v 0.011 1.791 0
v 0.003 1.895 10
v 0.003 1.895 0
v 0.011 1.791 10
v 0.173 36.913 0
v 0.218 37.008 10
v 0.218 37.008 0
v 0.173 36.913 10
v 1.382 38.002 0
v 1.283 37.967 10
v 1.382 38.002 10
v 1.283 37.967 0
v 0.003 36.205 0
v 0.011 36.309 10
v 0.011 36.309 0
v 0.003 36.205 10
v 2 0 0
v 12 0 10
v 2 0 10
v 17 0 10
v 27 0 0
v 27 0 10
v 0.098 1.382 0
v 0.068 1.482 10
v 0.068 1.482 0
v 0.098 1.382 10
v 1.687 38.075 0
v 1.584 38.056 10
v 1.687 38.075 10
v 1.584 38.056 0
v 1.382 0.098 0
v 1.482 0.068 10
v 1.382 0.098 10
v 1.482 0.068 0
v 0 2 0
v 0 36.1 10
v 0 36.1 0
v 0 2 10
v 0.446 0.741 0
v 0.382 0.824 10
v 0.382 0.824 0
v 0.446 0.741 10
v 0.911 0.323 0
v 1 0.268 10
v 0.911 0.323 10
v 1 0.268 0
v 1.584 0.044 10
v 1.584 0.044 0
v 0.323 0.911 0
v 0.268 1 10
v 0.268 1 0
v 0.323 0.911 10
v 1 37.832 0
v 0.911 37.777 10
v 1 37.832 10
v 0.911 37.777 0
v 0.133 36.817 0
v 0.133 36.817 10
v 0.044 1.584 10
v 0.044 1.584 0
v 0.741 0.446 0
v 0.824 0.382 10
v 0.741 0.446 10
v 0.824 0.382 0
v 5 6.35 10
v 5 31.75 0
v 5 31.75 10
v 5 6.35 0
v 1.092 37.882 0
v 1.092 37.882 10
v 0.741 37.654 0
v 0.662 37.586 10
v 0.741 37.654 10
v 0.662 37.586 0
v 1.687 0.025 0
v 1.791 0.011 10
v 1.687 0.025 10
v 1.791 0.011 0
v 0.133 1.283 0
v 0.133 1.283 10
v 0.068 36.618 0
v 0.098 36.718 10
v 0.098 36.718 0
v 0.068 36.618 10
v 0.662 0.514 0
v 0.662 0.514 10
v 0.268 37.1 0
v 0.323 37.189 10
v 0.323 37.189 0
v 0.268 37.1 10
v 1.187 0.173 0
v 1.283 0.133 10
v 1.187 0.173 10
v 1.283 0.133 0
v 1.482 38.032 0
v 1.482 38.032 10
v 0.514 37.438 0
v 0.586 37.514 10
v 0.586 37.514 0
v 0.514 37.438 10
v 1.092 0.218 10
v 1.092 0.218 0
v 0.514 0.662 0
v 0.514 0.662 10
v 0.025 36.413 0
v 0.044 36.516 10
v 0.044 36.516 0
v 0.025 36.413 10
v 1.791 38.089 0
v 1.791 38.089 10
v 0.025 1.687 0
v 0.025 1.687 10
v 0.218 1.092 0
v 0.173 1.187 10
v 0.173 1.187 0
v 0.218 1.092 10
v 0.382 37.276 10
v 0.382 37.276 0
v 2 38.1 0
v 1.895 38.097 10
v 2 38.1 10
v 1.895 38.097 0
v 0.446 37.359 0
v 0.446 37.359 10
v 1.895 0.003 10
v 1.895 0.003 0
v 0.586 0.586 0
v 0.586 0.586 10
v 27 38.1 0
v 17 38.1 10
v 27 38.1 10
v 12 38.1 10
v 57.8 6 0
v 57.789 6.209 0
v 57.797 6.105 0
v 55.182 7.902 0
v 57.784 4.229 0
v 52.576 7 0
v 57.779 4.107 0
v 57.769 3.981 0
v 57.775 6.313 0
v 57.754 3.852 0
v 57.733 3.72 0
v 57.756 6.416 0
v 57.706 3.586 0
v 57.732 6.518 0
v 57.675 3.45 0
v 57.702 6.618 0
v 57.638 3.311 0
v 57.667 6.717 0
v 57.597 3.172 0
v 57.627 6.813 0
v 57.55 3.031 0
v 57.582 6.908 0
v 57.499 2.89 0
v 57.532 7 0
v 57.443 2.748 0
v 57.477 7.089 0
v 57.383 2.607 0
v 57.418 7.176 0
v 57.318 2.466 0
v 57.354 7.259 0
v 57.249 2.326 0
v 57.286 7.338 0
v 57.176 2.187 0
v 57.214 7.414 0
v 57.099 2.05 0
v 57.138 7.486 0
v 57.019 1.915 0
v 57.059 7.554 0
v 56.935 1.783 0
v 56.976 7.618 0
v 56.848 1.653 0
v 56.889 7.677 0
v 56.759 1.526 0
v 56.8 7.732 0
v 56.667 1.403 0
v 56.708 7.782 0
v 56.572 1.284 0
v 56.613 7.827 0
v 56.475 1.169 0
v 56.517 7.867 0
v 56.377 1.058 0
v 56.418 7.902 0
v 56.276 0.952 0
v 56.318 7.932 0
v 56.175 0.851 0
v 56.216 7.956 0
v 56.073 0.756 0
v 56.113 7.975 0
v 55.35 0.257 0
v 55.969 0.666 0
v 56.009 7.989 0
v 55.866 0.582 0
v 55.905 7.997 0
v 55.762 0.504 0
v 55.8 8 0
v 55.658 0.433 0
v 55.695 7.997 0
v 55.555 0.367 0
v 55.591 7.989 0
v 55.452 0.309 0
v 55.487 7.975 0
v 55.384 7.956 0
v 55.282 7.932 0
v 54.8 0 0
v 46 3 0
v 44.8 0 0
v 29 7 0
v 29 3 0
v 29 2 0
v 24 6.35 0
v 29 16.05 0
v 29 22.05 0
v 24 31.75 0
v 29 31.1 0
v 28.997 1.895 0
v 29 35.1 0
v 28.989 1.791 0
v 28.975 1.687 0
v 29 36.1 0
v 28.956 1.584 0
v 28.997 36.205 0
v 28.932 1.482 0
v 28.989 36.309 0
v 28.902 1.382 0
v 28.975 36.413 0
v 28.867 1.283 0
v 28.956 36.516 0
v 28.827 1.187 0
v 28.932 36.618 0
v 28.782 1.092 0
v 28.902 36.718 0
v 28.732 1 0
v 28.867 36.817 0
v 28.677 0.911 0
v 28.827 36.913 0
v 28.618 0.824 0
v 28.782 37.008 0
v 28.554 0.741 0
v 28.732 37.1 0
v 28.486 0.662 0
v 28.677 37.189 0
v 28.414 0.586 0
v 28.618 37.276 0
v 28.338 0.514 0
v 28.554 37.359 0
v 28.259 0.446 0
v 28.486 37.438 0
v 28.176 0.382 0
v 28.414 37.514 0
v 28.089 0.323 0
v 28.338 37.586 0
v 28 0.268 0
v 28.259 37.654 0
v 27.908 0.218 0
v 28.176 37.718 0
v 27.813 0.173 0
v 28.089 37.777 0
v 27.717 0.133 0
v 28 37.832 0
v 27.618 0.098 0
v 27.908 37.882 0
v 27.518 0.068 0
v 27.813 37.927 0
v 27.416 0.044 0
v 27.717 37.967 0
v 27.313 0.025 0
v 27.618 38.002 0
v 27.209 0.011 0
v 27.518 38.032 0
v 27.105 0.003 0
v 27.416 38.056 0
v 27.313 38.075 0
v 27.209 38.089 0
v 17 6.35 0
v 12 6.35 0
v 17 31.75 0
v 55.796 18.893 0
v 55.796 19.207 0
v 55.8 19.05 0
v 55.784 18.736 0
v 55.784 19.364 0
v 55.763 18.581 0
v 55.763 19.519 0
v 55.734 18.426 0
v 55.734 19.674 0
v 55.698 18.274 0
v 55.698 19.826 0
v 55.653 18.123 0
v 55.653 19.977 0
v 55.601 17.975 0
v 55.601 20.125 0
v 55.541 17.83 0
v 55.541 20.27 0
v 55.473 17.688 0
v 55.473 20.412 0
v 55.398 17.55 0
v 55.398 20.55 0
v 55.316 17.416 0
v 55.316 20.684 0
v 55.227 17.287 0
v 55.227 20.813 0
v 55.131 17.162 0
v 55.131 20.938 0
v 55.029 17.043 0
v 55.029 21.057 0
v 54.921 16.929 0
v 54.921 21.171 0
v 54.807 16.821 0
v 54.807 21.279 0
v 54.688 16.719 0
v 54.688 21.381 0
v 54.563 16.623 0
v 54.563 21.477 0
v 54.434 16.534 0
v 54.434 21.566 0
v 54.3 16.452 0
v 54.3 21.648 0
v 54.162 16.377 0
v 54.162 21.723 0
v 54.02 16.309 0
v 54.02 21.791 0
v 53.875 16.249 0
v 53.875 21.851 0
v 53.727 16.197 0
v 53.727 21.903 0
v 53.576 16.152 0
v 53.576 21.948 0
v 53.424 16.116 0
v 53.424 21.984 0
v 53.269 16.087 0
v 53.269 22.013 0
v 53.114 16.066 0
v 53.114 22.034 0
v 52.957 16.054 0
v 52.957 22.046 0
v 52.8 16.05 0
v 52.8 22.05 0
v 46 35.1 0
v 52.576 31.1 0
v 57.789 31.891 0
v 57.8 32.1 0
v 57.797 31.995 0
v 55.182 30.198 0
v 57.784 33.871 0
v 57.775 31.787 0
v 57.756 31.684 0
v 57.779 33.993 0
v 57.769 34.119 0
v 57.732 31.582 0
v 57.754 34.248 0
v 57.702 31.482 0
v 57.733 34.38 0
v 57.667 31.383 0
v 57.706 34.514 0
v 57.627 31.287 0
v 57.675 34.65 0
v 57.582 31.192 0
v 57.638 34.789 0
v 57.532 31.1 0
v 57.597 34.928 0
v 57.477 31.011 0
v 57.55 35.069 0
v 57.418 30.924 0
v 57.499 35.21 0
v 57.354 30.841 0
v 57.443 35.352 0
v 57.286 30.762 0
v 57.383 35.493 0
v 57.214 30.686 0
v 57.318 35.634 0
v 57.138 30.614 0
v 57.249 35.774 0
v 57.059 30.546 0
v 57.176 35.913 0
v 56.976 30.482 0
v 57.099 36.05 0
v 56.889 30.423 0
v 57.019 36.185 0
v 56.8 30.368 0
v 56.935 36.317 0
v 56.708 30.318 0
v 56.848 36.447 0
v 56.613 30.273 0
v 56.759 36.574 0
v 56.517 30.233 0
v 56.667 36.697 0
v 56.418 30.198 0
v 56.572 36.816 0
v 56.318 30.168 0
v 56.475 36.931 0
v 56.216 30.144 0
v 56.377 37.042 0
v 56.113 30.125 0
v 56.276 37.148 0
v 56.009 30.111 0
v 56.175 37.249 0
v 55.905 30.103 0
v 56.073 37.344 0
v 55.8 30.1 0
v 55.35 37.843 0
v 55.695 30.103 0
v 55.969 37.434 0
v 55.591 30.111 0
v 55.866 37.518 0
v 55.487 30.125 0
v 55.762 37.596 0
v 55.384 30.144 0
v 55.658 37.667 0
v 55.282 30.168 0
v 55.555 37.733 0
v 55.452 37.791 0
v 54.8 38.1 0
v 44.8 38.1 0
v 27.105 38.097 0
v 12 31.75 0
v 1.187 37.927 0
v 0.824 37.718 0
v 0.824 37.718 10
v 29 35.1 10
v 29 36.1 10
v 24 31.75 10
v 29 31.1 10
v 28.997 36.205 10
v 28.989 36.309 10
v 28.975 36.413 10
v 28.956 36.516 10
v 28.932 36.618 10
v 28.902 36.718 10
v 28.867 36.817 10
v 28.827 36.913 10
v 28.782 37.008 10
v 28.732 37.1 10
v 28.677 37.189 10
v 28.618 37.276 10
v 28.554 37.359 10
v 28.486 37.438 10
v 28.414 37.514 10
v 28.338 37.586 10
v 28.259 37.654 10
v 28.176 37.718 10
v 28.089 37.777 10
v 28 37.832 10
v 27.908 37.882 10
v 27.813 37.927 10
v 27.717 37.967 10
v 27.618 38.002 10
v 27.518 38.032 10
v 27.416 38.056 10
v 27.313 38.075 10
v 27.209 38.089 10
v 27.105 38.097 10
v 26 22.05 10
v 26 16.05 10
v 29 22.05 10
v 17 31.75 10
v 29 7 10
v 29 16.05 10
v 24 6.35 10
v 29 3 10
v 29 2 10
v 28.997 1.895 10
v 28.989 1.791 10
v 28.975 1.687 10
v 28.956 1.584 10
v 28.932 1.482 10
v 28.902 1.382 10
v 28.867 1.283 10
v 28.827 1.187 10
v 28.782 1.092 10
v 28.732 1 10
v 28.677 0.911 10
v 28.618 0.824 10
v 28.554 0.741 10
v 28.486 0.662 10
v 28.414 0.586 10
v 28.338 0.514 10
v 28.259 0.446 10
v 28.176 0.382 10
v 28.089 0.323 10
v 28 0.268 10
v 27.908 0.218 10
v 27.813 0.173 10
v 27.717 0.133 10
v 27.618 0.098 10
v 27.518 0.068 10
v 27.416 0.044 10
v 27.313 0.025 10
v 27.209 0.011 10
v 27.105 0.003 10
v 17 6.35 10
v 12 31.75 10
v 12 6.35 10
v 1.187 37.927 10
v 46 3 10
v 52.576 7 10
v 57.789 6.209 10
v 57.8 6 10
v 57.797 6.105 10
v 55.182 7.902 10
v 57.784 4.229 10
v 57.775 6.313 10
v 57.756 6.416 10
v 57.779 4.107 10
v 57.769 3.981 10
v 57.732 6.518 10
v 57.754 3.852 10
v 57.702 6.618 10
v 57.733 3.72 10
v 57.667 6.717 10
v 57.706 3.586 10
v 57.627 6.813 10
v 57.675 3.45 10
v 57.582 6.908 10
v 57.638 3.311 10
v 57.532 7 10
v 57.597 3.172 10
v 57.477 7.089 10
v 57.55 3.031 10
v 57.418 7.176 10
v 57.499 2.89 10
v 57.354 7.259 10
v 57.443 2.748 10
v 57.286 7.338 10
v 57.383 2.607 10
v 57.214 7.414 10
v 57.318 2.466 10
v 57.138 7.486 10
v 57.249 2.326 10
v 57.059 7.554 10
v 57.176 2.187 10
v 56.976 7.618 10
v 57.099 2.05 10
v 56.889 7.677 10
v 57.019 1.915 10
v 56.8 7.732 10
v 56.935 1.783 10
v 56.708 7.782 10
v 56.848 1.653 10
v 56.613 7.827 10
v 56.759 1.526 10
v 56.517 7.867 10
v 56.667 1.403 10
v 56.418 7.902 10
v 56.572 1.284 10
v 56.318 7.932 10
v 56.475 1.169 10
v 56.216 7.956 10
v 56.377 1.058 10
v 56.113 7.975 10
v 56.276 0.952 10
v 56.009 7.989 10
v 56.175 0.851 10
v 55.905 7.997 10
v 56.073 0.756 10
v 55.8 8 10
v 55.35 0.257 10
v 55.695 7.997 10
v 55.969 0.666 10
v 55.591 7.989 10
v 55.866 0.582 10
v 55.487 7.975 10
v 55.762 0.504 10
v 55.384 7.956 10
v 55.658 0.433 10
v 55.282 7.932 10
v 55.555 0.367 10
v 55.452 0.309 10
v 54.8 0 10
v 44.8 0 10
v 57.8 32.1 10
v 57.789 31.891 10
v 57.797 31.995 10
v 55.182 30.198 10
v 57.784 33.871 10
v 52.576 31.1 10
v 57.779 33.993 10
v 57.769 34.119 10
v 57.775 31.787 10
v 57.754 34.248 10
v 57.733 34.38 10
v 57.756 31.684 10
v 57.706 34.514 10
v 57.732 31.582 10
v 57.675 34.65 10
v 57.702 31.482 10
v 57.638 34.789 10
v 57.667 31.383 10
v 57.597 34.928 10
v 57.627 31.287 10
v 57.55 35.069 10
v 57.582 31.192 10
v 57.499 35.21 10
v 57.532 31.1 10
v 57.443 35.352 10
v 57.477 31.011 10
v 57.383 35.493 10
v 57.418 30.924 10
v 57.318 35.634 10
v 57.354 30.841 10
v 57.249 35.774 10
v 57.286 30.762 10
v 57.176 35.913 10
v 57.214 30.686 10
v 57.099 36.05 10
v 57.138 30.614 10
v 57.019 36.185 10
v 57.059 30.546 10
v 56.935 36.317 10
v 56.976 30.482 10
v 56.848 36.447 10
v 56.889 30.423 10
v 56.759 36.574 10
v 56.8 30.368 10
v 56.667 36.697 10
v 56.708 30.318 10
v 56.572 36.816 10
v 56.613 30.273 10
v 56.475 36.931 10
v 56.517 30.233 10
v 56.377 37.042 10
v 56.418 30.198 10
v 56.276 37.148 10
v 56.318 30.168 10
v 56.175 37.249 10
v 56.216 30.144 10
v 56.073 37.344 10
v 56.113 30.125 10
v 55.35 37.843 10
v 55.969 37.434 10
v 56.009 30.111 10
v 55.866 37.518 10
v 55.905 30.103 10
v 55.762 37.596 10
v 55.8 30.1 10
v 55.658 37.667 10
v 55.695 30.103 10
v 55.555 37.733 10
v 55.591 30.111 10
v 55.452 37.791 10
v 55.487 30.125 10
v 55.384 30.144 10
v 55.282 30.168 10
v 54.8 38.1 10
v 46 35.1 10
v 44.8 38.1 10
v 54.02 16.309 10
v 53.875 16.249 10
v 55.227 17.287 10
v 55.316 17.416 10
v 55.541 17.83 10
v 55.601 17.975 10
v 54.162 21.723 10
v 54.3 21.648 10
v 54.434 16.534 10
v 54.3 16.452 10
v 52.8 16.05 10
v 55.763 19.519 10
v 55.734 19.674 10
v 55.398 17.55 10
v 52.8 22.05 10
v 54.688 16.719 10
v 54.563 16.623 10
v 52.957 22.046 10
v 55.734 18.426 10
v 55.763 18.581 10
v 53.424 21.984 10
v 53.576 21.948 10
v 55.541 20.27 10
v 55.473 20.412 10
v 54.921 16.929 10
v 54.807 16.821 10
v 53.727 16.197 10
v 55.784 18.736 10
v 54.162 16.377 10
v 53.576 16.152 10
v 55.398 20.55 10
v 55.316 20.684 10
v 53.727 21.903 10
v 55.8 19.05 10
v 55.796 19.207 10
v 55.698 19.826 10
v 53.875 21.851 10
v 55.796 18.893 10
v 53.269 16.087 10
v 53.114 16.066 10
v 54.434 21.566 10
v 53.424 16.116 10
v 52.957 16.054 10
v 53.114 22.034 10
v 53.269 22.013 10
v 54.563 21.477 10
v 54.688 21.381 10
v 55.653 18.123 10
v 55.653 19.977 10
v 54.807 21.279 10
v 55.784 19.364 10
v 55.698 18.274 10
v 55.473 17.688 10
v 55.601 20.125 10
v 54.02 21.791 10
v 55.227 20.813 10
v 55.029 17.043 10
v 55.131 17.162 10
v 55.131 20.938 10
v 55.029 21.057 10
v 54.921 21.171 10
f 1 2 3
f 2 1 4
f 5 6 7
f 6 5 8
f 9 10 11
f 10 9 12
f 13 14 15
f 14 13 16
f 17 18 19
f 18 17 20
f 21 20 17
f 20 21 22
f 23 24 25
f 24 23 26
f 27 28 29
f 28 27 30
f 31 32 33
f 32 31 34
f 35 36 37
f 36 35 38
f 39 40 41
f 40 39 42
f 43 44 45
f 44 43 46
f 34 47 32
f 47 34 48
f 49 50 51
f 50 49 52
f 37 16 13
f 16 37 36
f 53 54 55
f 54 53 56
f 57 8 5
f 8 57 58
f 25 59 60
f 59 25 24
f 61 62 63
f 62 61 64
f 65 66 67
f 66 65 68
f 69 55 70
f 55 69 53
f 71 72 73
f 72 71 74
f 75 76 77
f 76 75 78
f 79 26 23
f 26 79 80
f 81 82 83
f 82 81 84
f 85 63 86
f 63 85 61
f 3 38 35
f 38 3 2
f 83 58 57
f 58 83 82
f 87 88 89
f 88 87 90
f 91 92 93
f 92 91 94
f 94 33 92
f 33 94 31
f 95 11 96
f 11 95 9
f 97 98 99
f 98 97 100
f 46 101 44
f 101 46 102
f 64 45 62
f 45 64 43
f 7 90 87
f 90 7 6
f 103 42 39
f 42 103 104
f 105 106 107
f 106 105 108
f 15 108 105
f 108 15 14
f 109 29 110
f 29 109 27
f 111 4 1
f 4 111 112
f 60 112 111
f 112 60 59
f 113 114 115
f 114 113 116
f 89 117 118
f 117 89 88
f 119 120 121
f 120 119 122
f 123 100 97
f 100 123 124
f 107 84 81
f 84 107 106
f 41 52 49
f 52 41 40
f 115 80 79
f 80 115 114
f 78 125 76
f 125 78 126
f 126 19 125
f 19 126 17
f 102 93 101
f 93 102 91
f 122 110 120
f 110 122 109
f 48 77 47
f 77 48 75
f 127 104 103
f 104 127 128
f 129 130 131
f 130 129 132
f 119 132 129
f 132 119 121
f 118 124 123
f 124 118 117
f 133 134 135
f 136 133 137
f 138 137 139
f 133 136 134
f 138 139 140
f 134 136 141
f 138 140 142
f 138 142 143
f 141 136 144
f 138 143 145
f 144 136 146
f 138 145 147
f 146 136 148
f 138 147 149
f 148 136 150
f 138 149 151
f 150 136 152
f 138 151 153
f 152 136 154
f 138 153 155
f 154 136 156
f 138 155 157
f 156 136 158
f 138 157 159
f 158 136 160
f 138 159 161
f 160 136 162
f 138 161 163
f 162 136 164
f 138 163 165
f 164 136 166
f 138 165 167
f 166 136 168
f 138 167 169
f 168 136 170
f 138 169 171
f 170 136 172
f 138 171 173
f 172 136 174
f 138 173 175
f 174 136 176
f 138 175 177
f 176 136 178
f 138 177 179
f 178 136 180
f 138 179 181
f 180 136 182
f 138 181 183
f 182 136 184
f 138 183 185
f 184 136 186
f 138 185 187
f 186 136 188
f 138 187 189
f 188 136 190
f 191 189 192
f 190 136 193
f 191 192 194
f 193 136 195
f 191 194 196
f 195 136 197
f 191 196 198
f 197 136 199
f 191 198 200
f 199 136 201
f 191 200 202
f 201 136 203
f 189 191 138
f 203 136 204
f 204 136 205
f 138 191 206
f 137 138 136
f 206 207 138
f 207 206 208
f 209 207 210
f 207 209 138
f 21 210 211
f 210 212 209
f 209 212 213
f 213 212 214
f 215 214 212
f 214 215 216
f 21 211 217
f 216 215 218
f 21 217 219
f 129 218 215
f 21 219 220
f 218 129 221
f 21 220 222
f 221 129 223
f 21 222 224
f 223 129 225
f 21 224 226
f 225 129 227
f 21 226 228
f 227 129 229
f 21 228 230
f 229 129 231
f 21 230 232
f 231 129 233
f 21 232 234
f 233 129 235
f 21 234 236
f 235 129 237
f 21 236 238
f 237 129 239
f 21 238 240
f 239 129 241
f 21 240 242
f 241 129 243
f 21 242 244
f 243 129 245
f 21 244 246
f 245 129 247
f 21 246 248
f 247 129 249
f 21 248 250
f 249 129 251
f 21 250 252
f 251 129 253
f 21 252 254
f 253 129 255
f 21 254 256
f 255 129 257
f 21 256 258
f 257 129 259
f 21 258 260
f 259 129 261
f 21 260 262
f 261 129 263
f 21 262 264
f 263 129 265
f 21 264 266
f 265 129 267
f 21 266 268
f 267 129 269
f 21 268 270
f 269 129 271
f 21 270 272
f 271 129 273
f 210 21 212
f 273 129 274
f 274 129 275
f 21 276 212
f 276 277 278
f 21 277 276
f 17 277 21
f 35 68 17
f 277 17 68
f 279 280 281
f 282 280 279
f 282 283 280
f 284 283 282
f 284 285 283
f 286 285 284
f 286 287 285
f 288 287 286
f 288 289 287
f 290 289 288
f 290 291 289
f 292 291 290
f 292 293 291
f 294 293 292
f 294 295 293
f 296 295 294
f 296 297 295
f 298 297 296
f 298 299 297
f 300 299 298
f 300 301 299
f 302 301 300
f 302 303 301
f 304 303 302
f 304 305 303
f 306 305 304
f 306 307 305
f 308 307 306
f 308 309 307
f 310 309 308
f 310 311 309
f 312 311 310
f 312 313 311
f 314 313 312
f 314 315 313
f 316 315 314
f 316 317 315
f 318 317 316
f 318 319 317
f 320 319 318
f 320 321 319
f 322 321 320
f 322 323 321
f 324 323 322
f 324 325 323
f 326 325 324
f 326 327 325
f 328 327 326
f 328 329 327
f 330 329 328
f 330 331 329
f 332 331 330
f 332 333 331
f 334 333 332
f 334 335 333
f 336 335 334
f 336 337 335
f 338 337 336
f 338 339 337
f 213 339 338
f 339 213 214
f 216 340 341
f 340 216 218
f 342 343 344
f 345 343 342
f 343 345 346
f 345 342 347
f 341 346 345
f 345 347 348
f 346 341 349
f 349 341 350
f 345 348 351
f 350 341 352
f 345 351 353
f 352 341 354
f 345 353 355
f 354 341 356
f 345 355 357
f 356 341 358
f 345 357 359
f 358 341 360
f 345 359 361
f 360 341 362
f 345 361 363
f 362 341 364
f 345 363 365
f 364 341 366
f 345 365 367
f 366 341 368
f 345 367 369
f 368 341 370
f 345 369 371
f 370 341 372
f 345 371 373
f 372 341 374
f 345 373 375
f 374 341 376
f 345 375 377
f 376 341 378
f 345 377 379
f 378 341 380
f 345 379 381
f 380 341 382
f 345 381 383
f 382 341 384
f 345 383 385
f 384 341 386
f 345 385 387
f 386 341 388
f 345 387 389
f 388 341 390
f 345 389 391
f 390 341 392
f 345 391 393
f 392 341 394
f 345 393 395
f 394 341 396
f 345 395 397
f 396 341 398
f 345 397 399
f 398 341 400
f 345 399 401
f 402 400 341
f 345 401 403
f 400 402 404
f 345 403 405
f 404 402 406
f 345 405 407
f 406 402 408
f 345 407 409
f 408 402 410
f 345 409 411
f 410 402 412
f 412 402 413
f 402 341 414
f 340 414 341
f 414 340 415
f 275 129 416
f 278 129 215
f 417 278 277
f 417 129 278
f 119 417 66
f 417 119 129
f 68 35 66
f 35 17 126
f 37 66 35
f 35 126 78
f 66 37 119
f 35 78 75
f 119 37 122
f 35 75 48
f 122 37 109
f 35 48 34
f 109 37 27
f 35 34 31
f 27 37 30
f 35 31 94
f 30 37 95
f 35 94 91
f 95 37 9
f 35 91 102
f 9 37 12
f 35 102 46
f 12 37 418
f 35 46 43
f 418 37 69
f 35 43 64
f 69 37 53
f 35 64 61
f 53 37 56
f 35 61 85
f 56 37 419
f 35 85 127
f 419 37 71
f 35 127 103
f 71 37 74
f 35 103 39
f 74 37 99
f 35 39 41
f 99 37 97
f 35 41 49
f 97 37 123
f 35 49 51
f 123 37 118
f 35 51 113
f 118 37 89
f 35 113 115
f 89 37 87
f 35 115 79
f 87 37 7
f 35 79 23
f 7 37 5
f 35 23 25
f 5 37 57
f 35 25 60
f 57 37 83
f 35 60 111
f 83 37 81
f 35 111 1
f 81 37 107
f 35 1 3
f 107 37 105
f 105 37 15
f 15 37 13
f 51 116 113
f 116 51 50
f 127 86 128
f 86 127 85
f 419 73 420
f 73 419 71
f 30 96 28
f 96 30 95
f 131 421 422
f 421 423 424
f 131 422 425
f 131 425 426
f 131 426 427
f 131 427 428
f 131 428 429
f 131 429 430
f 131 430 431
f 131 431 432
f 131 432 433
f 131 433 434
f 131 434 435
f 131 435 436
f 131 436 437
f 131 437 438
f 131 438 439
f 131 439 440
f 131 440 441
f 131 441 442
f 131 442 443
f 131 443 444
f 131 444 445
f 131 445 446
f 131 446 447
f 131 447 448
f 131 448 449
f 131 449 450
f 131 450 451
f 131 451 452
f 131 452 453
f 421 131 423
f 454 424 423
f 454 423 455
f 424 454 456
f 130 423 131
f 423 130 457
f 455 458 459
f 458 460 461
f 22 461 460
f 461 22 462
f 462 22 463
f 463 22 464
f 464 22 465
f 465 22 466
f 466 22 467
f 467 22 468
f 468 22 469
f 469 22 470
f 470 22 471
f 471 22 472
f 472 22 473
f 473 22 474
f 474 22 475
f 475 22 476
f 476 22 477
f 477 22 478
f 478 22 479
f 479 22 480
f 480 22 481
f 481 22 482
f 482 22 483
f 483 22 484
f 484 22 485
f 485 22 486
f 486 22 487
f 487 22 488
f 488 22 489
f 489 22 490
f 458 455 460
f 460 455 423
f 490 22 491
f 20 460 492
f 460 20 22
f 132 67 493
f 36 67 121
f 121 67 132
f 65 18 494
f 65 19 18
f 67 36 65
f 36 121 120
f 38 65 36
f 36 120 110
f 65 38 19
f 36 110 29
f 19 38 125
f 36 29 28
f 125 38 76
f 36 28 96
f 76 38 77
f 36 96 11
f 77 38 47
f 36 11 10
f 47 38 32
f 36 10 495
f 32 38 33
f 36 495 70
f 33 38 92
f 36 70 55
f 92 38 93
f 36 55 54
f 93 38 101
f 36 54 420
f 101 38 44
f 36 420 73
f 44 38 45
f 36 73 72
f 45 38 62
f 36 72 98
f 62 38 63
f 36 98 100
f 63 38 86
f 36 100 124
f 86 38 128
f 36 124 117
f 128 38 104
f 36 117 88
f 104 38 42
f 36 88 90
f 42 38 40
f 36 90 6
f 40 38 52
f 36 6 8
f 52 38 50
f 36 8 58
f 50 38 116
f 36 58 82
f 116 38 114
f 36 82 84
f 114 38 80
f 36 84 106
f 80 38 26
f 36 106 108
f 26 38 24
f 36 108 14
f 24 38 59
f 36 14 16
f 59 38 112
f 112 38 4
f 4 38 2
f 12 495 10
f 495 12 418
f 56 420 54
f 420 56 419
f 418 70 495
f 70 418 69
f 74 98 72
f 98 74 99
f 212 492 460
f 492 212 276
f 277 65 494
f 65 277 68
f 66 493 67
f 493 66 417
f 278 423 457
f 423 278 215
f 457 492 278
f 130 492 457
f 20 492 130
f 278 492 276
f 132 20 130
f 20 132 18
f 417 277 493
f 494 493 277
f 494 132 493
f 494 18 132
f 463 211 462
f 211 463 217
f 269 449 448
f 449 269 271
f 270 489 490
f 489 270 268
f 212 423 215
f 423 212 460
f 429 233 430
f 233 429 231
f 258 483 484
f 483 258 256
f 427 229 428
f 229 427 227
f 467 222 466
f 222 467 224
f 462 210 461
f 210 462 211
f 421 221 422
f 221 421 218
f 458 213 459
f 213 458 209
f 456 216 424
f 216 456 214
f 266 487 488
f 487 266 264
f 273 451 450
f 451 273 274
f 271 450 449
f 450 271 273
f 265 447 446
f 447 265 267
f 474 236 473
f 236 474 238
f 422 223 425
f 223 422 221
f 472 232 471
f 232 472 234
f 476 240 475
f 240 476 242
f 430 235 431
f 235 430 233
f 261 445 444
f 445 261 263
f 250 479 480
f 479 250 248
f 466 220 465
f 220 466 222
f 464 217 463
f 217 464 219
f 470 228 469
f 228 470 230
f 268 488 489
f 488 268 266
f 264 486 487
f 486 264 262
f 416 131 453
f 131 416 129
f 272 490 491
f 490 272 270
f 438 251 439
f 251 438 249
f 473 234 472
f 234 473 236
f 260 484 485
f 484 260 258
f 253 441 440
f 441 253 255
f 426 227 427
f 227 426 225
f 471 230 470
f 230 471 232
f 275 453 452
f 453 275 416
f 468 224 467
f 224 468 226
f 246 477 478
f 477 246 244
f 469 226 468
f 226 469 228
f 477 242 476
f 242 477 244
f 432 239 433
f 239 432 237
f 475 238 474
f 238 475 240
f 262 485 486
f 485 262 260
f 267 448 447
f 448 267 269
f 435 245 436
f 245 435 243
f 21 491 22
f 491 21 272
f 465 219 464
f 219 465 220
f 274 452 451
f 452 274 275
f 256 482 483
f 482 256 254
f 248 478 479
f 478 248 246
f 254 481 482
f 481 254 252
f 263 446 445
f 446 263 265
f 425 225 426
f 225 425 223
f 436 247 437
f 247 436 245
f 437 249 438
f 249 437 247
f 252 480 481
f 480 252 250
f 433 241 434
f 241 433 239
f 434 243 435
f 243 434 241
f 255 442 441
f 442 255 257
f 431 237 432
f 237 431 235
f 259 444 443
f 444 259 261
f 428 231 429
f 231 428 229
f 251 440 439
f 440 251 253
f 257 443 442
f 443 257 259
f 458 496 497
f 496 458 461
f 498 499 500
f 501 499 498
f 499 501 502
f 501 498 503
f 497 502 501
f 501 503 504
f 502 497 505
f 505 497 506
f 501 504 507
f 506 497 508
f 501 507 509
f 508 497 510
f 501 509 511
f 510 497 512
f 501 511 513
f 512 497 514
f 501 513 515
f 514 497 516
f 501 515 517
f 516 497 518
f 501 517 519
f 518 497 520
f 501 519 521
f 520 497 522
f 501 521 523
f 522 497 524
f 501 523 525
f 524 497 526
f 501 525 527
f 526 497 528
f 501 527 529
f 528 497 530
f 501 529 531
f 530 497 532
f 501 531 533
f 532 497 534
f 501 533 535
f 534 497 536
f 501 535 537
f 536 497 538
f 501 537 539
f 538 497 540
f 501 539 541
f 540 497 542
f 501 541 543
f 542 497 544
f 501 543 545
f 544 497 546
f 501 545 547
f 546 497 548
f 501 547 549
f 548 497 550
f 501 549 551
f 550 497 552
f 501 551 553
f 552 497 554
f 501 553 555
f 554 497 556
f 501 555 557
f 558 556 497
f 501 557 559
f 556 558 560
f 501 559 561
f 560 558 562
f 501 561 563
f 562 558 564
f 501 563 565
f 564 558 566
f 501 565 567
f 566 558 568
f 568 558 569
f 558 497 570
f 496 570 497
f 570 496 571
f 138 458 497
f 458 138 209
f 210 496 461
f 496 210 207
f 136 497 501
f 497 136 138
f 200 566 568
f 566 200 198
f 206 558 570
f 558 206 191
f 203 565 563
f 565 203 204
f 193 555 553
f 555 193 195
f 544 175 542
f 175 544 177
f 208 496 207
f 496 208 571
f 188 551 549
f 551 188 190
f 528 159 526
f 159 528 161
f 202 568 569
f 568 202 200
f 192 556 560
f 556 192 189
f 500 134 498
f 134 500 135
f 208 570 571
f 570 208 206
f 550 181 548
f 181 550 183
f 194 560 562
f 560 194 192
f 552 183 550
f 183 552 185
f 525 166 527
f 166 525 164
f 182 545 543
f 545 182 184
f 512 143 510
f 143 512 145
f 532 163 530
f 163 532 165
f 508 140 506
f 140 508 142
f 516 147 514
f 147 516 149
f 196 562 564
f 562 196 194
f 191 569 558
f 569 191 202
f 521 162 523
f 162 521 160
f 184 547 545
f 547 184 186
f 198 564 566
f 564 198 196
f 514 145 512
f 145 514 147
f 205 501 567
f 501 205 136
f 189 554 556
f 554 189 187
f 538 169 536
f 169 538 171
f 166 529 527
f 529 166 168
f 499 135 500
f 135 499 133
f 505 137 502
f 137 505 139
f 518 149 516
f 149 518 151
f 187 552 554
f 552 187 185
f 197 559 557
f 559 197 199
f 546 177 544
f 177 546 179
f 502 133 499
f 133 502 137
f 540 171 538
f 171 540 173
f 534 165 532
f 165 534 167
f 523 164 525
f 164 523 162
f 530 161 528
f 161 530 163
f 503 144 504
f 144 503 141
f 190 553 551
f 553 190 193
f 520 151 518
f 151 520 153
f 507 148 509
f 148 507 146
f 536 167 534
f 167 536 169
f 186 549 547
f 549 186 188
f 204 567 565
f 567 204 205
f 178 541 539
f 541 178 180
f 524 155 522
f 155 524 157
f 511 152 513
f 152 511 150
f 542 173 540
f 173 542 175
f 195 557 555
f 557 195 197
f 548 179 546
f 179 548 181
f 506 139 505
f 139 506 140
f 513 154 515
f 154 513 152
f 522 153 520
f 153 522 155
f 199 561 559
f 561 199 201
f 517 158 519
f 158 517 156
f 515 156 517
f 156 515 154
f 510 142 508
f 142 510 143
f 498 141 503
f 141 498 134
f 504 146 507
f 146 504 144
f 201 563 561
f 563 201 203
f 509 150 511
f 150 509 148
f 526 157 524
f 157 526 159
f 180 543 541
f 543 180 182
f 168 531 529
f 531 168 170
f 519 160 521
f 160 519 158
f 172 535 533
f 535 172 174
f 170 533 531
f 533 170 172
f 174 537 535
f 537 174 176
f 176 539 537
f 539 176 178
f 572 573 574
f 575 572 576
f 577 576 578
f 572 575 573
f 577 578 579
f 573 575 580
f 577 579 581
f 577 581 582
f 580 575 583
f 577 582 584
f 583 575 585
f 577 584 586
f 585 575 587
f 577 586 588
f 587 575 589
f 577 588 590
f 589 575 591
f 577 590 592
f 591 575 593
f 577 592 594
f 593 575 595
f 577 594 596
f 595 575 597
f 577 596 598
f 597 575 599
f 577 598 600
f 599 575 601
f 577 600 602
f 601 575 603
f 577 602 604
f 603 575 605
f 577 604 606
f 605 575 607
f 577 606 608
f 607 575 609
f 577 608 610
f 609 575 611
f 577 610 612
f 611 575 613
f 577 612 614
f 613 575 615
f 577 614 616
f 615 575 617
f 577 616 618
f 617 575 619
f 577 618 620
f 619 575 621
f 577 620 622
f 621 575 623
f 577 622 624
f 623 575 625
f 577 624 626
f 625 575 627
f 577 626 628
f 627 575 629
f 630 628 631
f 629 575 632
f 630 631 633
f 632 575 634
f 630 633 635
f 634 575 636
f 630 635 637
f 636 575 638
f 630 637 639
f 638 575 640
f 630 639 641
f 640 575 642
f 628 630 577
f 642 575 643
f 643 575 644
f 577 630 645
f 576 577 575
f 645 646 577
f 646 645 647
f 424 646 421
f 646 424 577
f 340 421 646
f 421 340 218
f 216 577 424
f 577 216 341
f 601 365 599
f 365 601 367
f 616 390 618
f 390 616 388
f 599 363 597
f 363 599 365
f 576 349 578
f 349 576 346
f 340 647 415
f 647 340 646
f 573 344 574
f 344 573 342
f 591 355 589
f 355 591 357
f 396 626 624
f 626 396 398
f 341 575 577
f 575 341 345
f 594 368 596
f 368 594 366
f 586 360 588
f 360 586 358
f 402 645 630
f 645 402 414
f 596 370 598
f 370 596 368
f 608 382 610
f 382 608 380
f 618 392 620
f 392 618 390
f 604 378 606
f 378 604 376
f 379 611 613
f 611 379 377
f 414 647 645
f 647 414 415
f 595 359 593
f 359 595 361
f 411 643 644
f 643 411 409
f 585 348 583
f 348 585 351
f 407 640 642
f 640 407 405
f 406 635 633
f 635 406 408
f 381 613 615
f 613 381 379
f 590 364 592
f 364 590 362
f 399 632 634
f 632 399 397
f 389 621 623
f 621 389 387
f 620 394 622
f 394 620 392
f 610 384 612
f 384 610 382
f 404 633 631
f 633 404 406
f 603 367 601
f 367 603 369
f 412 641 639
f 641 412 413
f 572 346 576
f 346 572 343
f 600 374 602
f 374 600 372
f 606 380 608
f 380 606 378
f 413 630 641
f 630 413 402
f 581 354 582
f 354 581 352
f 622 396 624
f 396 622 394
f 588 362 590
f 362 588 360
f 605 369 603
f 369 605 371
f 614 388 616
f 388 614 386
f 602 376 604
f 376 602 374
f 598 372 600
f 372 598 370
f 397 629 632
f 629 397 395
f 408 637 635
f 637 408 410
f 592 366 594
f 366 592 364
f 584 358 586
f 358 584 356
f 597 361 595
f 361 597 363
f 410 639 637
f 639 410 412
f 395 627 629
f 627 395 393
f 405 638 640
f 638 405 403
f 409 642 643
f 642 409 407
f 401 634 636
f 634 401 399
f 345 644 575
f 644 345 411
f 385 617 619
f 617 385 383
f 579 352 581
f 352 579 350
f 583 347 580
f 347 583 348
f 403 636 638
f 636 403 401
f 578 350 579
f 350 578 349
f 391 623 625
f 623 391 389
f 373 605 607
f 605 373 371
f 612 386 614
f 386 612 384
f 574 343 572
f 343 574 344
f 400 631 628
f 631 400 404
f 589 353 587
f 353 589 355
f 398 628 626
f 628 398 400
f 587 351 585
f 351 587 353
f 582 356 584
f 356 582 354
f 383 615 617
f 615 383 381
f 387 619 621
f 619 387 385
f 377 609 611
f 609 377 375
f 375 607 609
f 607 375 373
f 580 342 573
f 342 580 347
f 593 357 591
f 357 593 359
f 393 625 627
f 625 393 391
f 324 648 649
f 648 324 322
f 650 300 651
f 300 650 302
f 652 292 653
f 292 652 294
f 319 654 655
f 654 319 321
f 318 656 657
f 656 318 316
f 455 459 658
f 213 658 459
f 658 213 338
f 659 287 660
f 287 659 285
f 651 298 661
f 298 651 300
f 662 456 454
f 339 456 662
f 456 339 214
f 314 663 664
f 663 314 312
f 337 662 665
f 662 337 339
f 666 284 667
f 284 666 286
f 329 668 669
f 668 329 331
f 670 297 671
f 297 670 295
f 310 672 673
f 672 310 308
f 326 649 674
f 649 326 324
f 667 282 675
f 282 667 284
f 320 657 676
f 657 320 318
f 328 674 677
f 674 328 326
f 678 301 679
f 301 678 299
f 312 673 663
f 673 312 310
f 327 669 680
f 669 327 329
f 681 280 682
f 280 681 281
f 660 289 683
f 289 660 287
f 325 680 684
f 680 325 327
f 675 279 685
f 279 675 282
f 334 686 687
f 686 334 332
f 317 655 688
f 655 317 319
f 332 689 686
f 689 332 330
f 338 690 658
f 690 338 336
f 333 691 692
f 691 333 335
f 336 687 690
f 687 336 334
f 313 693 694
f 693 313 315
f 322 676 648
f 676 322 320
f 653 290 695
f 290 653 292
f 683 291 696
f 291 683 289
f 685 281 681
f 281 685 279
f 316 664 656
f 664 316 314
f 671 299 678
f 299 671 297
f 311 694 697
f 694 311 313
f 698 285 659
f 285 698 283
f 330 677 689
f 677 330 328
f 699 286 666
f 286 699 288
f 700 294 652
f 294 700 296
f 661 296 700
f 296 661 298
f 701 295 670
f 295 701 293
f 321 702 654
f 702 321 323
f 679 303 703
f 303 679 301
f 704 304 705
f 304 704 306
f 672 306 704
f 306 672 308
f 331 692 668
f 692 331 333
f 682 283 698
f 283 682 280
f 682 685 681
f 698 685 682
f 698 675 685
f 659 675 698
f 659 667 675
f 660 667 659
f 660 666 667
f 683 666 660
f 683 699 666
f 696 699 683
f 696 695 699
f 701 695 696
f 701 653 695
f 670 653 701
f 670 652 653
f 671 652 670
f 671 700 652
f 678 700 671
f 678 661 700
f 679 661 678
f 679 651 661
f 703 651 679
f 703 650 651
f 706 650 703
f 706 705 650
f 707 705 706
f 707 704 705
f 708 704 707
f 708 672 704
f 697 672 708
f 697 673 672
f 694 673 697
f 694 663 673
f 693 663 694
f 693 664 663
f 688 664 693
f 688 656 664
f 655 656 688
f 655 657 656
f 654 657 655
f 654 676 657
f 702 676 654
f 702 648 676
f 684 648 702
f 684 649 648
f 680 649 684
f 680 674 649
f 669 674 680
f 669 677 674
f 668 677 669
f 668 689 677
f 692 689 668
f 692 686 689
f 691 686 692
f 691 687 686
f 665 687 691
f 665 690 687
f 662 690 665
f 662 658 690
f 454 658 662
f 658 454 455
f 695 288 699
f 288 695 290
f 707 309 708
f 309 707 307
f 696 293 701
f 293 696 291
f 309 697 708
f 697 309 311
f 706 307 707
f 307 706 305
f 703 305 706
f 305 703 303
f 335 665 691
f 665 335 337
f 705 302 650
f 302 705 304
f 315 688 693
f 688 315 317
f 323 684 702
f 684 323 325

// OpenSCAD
// Used under Creative-Commons BY-SA from You Magazine by "amcmichael" https://youmagine.com/amcmichael
// Buckle Dimensions
buckle_width  = 25.4; // Buckle dimension based on the inner width of the strap connector
buckle_height = 10;
buckle_length = buckle_width*2;

// Clip Dimensions
clip_length       = 24; 
clip_width        = 6.35; // extra material added to side of clip 
clip_clasp_length = 5;

// Prong Dimensions
prong_length       = buckle_length - clip_length;
prong_center_width = 6; // width of the center prong
prong_center_tap   = prong_center_width/2;
prong_side_width   = 4; // width of the side prongs
prong_offset       = 3; // difference between prong location and overall buckle width

// Locking Mechanism
lock_length = 10;
lock_width  = 5;
lock_offset = 2; // the latching angle (decrease for smaller locking angle)

// Casing Dimensions
case_thickness     = 2;   // must be equal to or less than the locking mechanism prong
sf                 = 1;   // safety factor for fitting between male and female buckle
track_thickness    = 2;   // the center prong track thickness
track_height       = 2;
wiggle_room_factor = 1.2; // the room the locking mechanism is allowed to move forward and backward while connected

// Rounded edges
minkowski_rad    = 2;
minkowski_height = 0.1;
$fn = 120;

// Make Buckle
//translate([12, 40, 0])female_buckle();
//female_buckle();
male_buckle();


// Female
module female_buckle(){
    
    difference(){
        union(){
            female_clip();
            female_casing();
        }        
  
        // Locking mechanism access ellipse 1
        translate([lock_length+lock_offset+clip_length/2, 0, -2])
            scale([1, 0.5])            
                linear_extrude(height=buckle_height*2)
                    circle(d=20);
        
        // Locking mechanism access ellipse 2        
        translate([lock_length+lock_offset+clip_length/2, buckle_width+2*(clip_width-minkowski_rad)+2*sf+case_thickness, -2])
            scale([1, 0.5])
                linear_extrude(height=buckle_height*2)
                    circle(d=20);
    }
}

module female_clip(){    
    
    // back
    minkowski(){   
        translate([minkowski_rad, minkowski_rad, 0])
            cube([clip_clasp_length-2*minkowski_rad, buckle_width+2*(clip_width-minkowski_rad), buckle_height/2-minkowski_height+2*case_thickness+sf]);      
        cylinder(r=minkowski_rad, h=minkowski_height);       
    } 
    
    // side 1
    minkowski(){
        translate([minkowski_rad, minkowski_rad, 0])
            cube([clip_length/2, clip_width-2*minkowski_rad, buckle_height-minkowski_height+2*case_thickness+sf]);
        cylinder(r=minkowski_rad, h=minkowski_height);
    } 
    
    // side 2  
    minkowski(){
        translate([minkowski_rad, buckle_width+clip_width+minkowski_rad, 0])
            cube([clip_length/2, clip_width-2*minkowski_rad, buckle_height-minkowski_height+2*case_thickness+sf]);
        cylinder(r=minkowski_rad, h=minkowski_height);
    } 
    
    // base of clip and start of casing
    minkowski(){
        translate([clip_length/2+minkowski_rad, minkowski_rad, 0])
            cube([clip_clasp_length-2*minkowski_rad, buckle_width+2*(clip_width-minkowski_rad), buckle_height-minkowski_height+2*case_thickness+sf]);
        cylinder(r=minkowski_rad, h=minkowski_height);
    } 
}

module female_casing(){
    
    // bottom
    translate([clip_length/2+2*minkowski_rad, 0, 0])
            cube([prong_length*wiggle_room_factor, buckle_width+2*clip_width, case_thickness]);
    
    // top
    translate([clip_length/2+2*minkowski_rad, 0, buckle_height+case_thickness+sf])
            cube([prong_length*wiggle_room_factor, buckle_width+2*clip_width, case_thickness]);
    
    // side 1
    difference(){
        translate([clip_length/2, 0, 0])
            cube([prong_length*wiggle_room_factor+2*minkowski_rad, case_thickness, buckle_height+2*case_thickness+sf]);        
       translate([lock_length+clip_length/2, -sf/2, (buckle_height+sf)/6])
            cube([lock_length+lock_offset, case_thickness+sf, buckle_height+sf]); 
    }        
    
    // side 2
    difference(){
        translate([clip_length/2, buckle_width+2*(clip_width-minkowski_rad)+2*sf, 0])
            cube([prong_length*wiggle_room_factor+2*minkowski_rad, case_thickness, buckle_height+2*case_thickness+sf]);
        translate([lock_length+clip_length/2, buckle_width+2*(clip_width-minkowski_rad)+2*sf-sf/2, (buckle_height+sf)/6])
            cube([lock_length+lock_offset, case_thickness+sf, buckle_height+sf]);        
    }   
    
    // center prong tracks    
    center = buckle_width+2*(clip_width-minkowski_rad)+2*sf; // reference point to the center of the casing (y direction)
    top_track_ref = buckle_height+case_thickness-track_height/2; // reference point for top tracks (z direction)
    
    translate([clip_length/2, (center+prong_center_width)/2+track_thickness, case_thickness])
            cube([prong_length*wiggle_room_factor+2*minkowski_rad, track_thickness, track_height]); // bot side 2
    translate([clip_length/2, (center-prong_center_width)/2-track_thickness, case_thickness])
            cube([prong_length*wiggle_room_factor+2*minkowski_rad, track_thickness, track_height]); // bot side 1
    translate([clip_length/2, (center+prong_center_width)/2+track_thickness, top_track_ref])
            cube([prong_length*wiggle_room_factor+2*minkowski_rad, track_thickness, track_height]); // top side 2
    translate([clip_length/2, (center-prong_center_width)/2-track_thickness, top_track_ref])
            cube([prong_length*wiggle_room_factor+2*minkowski_rad, track_thickness, track_height]); // top side 1
}

// Male
module male_buckle(){
    
    union(){
        male_clip();
        male_prongs();
    }    
}

module male_clip(){
    
    // back
    minkowski(){   
        translate([minkowski_rad, minkowski_rad, 0])
            cube([clip_clasp_length-2*minkowski_rad, buckle_width+2*(clip_width-minkowski_rad), buckle_height-minkowski_height]);      
        cylinder(r=minkowski_rad, h=minkowski_height);       
    } 
    
    // side 1
    minkowski(){
        translate([minkowski_rad, minkowski_rad, 0])
            cube([clip_length, clip_width-2*minkowski_rad, buckle_height-minkowski_height]);
        cylinder(r=minkowski_rad, h=minkowski_height);
    }     
    
    // side 2  
    minkowski(){
        translate([minkowski_rad, buckle_width+clip_width+minkowski_rad, 0])
            cube([clip_length, clip_width-2*minkowski_rad, buckle_height-minkowski_height]);
        cylinder(r=minkowski_rad, h=minkowski_height);
    }    
   
    // center
    translate([clip_length/2, 0, 0])
        cube([clip_clasp_length, buckle_width+2*clip_width, buckle_height]);     
    
    // base of clip and start of prongs
    minkowski(){
        translate([clip_length+minkowski_rad, minkowski_rad, 0])
            cube([clip_clasp_length-2*minkowski_rad, buckle_width+2*(clip_width-minkowski_rad), buckle_height-minkowski_height]);
        cylinder(r=minkowski_rad, h=minkowski_height);
    } 
}

module male_prongs(){
    
    // side 1: prong
    translate([clip_length+clip_clasp_length, prong_offset, 0])
        cube([prong_length, prong_side_width, buckle_height]);    
    
    // side 1: locking mechanism
    locking_mechanism(); 
    
    // side 2: prong    
    translate([clip_length+clip_clasp_length, buckle_width+2*clip_width-prong_side_width-prong_offset, 0])
        cube([prong_length, prong_side_width, buckle_height]);
    
    // side 2: locking mechanism
    translate([0, buckle_width+2*clip_width, 0])
        mirror([0, 1, 0])
            locking_mechanism();
    
    // center
    hull(){
        translate([clip_length+clip_clasp_length-prong_center_tap, (buckle_width-prong_center_width)/2+clip_width, 0])
        cube([prong_length, prong_center_width, buckle_height]);
        translate([clip_length+clip_clasp_length+prong_length-prong_center_tap, buckle_width/2+clip_width, 0])
            cylinder(r=prong_center_tap, h=buckle_height);        
    }
}

module locking_mechanism(){
    
    vert_pos = prong_offset - 3; // offset of locking mechanism from prong
    
    hull(){
        translate([buckle_length+clip_clasp_length-11, vert_pos, 0])
            linear_extrude(buckle_height)
                polygon(points=[[0, 0],[lock_length, 0],[lock_length+lock_offset, lock_width],[lock_offset, lock_width]]); 
        translate([buckle_length+clip_clasp_length, 6+vert_pos, 0])
            cylinder(r=2, h=buckle_height); 
       translate([buckle_length+clip_clasp_length, 2.8, 0])
            rotate([0, 0, 60])
                scale([1, 0.5])                 
                linear_extrude(height=buckle_height)
                    circle(d=6);
        
    } 
}
